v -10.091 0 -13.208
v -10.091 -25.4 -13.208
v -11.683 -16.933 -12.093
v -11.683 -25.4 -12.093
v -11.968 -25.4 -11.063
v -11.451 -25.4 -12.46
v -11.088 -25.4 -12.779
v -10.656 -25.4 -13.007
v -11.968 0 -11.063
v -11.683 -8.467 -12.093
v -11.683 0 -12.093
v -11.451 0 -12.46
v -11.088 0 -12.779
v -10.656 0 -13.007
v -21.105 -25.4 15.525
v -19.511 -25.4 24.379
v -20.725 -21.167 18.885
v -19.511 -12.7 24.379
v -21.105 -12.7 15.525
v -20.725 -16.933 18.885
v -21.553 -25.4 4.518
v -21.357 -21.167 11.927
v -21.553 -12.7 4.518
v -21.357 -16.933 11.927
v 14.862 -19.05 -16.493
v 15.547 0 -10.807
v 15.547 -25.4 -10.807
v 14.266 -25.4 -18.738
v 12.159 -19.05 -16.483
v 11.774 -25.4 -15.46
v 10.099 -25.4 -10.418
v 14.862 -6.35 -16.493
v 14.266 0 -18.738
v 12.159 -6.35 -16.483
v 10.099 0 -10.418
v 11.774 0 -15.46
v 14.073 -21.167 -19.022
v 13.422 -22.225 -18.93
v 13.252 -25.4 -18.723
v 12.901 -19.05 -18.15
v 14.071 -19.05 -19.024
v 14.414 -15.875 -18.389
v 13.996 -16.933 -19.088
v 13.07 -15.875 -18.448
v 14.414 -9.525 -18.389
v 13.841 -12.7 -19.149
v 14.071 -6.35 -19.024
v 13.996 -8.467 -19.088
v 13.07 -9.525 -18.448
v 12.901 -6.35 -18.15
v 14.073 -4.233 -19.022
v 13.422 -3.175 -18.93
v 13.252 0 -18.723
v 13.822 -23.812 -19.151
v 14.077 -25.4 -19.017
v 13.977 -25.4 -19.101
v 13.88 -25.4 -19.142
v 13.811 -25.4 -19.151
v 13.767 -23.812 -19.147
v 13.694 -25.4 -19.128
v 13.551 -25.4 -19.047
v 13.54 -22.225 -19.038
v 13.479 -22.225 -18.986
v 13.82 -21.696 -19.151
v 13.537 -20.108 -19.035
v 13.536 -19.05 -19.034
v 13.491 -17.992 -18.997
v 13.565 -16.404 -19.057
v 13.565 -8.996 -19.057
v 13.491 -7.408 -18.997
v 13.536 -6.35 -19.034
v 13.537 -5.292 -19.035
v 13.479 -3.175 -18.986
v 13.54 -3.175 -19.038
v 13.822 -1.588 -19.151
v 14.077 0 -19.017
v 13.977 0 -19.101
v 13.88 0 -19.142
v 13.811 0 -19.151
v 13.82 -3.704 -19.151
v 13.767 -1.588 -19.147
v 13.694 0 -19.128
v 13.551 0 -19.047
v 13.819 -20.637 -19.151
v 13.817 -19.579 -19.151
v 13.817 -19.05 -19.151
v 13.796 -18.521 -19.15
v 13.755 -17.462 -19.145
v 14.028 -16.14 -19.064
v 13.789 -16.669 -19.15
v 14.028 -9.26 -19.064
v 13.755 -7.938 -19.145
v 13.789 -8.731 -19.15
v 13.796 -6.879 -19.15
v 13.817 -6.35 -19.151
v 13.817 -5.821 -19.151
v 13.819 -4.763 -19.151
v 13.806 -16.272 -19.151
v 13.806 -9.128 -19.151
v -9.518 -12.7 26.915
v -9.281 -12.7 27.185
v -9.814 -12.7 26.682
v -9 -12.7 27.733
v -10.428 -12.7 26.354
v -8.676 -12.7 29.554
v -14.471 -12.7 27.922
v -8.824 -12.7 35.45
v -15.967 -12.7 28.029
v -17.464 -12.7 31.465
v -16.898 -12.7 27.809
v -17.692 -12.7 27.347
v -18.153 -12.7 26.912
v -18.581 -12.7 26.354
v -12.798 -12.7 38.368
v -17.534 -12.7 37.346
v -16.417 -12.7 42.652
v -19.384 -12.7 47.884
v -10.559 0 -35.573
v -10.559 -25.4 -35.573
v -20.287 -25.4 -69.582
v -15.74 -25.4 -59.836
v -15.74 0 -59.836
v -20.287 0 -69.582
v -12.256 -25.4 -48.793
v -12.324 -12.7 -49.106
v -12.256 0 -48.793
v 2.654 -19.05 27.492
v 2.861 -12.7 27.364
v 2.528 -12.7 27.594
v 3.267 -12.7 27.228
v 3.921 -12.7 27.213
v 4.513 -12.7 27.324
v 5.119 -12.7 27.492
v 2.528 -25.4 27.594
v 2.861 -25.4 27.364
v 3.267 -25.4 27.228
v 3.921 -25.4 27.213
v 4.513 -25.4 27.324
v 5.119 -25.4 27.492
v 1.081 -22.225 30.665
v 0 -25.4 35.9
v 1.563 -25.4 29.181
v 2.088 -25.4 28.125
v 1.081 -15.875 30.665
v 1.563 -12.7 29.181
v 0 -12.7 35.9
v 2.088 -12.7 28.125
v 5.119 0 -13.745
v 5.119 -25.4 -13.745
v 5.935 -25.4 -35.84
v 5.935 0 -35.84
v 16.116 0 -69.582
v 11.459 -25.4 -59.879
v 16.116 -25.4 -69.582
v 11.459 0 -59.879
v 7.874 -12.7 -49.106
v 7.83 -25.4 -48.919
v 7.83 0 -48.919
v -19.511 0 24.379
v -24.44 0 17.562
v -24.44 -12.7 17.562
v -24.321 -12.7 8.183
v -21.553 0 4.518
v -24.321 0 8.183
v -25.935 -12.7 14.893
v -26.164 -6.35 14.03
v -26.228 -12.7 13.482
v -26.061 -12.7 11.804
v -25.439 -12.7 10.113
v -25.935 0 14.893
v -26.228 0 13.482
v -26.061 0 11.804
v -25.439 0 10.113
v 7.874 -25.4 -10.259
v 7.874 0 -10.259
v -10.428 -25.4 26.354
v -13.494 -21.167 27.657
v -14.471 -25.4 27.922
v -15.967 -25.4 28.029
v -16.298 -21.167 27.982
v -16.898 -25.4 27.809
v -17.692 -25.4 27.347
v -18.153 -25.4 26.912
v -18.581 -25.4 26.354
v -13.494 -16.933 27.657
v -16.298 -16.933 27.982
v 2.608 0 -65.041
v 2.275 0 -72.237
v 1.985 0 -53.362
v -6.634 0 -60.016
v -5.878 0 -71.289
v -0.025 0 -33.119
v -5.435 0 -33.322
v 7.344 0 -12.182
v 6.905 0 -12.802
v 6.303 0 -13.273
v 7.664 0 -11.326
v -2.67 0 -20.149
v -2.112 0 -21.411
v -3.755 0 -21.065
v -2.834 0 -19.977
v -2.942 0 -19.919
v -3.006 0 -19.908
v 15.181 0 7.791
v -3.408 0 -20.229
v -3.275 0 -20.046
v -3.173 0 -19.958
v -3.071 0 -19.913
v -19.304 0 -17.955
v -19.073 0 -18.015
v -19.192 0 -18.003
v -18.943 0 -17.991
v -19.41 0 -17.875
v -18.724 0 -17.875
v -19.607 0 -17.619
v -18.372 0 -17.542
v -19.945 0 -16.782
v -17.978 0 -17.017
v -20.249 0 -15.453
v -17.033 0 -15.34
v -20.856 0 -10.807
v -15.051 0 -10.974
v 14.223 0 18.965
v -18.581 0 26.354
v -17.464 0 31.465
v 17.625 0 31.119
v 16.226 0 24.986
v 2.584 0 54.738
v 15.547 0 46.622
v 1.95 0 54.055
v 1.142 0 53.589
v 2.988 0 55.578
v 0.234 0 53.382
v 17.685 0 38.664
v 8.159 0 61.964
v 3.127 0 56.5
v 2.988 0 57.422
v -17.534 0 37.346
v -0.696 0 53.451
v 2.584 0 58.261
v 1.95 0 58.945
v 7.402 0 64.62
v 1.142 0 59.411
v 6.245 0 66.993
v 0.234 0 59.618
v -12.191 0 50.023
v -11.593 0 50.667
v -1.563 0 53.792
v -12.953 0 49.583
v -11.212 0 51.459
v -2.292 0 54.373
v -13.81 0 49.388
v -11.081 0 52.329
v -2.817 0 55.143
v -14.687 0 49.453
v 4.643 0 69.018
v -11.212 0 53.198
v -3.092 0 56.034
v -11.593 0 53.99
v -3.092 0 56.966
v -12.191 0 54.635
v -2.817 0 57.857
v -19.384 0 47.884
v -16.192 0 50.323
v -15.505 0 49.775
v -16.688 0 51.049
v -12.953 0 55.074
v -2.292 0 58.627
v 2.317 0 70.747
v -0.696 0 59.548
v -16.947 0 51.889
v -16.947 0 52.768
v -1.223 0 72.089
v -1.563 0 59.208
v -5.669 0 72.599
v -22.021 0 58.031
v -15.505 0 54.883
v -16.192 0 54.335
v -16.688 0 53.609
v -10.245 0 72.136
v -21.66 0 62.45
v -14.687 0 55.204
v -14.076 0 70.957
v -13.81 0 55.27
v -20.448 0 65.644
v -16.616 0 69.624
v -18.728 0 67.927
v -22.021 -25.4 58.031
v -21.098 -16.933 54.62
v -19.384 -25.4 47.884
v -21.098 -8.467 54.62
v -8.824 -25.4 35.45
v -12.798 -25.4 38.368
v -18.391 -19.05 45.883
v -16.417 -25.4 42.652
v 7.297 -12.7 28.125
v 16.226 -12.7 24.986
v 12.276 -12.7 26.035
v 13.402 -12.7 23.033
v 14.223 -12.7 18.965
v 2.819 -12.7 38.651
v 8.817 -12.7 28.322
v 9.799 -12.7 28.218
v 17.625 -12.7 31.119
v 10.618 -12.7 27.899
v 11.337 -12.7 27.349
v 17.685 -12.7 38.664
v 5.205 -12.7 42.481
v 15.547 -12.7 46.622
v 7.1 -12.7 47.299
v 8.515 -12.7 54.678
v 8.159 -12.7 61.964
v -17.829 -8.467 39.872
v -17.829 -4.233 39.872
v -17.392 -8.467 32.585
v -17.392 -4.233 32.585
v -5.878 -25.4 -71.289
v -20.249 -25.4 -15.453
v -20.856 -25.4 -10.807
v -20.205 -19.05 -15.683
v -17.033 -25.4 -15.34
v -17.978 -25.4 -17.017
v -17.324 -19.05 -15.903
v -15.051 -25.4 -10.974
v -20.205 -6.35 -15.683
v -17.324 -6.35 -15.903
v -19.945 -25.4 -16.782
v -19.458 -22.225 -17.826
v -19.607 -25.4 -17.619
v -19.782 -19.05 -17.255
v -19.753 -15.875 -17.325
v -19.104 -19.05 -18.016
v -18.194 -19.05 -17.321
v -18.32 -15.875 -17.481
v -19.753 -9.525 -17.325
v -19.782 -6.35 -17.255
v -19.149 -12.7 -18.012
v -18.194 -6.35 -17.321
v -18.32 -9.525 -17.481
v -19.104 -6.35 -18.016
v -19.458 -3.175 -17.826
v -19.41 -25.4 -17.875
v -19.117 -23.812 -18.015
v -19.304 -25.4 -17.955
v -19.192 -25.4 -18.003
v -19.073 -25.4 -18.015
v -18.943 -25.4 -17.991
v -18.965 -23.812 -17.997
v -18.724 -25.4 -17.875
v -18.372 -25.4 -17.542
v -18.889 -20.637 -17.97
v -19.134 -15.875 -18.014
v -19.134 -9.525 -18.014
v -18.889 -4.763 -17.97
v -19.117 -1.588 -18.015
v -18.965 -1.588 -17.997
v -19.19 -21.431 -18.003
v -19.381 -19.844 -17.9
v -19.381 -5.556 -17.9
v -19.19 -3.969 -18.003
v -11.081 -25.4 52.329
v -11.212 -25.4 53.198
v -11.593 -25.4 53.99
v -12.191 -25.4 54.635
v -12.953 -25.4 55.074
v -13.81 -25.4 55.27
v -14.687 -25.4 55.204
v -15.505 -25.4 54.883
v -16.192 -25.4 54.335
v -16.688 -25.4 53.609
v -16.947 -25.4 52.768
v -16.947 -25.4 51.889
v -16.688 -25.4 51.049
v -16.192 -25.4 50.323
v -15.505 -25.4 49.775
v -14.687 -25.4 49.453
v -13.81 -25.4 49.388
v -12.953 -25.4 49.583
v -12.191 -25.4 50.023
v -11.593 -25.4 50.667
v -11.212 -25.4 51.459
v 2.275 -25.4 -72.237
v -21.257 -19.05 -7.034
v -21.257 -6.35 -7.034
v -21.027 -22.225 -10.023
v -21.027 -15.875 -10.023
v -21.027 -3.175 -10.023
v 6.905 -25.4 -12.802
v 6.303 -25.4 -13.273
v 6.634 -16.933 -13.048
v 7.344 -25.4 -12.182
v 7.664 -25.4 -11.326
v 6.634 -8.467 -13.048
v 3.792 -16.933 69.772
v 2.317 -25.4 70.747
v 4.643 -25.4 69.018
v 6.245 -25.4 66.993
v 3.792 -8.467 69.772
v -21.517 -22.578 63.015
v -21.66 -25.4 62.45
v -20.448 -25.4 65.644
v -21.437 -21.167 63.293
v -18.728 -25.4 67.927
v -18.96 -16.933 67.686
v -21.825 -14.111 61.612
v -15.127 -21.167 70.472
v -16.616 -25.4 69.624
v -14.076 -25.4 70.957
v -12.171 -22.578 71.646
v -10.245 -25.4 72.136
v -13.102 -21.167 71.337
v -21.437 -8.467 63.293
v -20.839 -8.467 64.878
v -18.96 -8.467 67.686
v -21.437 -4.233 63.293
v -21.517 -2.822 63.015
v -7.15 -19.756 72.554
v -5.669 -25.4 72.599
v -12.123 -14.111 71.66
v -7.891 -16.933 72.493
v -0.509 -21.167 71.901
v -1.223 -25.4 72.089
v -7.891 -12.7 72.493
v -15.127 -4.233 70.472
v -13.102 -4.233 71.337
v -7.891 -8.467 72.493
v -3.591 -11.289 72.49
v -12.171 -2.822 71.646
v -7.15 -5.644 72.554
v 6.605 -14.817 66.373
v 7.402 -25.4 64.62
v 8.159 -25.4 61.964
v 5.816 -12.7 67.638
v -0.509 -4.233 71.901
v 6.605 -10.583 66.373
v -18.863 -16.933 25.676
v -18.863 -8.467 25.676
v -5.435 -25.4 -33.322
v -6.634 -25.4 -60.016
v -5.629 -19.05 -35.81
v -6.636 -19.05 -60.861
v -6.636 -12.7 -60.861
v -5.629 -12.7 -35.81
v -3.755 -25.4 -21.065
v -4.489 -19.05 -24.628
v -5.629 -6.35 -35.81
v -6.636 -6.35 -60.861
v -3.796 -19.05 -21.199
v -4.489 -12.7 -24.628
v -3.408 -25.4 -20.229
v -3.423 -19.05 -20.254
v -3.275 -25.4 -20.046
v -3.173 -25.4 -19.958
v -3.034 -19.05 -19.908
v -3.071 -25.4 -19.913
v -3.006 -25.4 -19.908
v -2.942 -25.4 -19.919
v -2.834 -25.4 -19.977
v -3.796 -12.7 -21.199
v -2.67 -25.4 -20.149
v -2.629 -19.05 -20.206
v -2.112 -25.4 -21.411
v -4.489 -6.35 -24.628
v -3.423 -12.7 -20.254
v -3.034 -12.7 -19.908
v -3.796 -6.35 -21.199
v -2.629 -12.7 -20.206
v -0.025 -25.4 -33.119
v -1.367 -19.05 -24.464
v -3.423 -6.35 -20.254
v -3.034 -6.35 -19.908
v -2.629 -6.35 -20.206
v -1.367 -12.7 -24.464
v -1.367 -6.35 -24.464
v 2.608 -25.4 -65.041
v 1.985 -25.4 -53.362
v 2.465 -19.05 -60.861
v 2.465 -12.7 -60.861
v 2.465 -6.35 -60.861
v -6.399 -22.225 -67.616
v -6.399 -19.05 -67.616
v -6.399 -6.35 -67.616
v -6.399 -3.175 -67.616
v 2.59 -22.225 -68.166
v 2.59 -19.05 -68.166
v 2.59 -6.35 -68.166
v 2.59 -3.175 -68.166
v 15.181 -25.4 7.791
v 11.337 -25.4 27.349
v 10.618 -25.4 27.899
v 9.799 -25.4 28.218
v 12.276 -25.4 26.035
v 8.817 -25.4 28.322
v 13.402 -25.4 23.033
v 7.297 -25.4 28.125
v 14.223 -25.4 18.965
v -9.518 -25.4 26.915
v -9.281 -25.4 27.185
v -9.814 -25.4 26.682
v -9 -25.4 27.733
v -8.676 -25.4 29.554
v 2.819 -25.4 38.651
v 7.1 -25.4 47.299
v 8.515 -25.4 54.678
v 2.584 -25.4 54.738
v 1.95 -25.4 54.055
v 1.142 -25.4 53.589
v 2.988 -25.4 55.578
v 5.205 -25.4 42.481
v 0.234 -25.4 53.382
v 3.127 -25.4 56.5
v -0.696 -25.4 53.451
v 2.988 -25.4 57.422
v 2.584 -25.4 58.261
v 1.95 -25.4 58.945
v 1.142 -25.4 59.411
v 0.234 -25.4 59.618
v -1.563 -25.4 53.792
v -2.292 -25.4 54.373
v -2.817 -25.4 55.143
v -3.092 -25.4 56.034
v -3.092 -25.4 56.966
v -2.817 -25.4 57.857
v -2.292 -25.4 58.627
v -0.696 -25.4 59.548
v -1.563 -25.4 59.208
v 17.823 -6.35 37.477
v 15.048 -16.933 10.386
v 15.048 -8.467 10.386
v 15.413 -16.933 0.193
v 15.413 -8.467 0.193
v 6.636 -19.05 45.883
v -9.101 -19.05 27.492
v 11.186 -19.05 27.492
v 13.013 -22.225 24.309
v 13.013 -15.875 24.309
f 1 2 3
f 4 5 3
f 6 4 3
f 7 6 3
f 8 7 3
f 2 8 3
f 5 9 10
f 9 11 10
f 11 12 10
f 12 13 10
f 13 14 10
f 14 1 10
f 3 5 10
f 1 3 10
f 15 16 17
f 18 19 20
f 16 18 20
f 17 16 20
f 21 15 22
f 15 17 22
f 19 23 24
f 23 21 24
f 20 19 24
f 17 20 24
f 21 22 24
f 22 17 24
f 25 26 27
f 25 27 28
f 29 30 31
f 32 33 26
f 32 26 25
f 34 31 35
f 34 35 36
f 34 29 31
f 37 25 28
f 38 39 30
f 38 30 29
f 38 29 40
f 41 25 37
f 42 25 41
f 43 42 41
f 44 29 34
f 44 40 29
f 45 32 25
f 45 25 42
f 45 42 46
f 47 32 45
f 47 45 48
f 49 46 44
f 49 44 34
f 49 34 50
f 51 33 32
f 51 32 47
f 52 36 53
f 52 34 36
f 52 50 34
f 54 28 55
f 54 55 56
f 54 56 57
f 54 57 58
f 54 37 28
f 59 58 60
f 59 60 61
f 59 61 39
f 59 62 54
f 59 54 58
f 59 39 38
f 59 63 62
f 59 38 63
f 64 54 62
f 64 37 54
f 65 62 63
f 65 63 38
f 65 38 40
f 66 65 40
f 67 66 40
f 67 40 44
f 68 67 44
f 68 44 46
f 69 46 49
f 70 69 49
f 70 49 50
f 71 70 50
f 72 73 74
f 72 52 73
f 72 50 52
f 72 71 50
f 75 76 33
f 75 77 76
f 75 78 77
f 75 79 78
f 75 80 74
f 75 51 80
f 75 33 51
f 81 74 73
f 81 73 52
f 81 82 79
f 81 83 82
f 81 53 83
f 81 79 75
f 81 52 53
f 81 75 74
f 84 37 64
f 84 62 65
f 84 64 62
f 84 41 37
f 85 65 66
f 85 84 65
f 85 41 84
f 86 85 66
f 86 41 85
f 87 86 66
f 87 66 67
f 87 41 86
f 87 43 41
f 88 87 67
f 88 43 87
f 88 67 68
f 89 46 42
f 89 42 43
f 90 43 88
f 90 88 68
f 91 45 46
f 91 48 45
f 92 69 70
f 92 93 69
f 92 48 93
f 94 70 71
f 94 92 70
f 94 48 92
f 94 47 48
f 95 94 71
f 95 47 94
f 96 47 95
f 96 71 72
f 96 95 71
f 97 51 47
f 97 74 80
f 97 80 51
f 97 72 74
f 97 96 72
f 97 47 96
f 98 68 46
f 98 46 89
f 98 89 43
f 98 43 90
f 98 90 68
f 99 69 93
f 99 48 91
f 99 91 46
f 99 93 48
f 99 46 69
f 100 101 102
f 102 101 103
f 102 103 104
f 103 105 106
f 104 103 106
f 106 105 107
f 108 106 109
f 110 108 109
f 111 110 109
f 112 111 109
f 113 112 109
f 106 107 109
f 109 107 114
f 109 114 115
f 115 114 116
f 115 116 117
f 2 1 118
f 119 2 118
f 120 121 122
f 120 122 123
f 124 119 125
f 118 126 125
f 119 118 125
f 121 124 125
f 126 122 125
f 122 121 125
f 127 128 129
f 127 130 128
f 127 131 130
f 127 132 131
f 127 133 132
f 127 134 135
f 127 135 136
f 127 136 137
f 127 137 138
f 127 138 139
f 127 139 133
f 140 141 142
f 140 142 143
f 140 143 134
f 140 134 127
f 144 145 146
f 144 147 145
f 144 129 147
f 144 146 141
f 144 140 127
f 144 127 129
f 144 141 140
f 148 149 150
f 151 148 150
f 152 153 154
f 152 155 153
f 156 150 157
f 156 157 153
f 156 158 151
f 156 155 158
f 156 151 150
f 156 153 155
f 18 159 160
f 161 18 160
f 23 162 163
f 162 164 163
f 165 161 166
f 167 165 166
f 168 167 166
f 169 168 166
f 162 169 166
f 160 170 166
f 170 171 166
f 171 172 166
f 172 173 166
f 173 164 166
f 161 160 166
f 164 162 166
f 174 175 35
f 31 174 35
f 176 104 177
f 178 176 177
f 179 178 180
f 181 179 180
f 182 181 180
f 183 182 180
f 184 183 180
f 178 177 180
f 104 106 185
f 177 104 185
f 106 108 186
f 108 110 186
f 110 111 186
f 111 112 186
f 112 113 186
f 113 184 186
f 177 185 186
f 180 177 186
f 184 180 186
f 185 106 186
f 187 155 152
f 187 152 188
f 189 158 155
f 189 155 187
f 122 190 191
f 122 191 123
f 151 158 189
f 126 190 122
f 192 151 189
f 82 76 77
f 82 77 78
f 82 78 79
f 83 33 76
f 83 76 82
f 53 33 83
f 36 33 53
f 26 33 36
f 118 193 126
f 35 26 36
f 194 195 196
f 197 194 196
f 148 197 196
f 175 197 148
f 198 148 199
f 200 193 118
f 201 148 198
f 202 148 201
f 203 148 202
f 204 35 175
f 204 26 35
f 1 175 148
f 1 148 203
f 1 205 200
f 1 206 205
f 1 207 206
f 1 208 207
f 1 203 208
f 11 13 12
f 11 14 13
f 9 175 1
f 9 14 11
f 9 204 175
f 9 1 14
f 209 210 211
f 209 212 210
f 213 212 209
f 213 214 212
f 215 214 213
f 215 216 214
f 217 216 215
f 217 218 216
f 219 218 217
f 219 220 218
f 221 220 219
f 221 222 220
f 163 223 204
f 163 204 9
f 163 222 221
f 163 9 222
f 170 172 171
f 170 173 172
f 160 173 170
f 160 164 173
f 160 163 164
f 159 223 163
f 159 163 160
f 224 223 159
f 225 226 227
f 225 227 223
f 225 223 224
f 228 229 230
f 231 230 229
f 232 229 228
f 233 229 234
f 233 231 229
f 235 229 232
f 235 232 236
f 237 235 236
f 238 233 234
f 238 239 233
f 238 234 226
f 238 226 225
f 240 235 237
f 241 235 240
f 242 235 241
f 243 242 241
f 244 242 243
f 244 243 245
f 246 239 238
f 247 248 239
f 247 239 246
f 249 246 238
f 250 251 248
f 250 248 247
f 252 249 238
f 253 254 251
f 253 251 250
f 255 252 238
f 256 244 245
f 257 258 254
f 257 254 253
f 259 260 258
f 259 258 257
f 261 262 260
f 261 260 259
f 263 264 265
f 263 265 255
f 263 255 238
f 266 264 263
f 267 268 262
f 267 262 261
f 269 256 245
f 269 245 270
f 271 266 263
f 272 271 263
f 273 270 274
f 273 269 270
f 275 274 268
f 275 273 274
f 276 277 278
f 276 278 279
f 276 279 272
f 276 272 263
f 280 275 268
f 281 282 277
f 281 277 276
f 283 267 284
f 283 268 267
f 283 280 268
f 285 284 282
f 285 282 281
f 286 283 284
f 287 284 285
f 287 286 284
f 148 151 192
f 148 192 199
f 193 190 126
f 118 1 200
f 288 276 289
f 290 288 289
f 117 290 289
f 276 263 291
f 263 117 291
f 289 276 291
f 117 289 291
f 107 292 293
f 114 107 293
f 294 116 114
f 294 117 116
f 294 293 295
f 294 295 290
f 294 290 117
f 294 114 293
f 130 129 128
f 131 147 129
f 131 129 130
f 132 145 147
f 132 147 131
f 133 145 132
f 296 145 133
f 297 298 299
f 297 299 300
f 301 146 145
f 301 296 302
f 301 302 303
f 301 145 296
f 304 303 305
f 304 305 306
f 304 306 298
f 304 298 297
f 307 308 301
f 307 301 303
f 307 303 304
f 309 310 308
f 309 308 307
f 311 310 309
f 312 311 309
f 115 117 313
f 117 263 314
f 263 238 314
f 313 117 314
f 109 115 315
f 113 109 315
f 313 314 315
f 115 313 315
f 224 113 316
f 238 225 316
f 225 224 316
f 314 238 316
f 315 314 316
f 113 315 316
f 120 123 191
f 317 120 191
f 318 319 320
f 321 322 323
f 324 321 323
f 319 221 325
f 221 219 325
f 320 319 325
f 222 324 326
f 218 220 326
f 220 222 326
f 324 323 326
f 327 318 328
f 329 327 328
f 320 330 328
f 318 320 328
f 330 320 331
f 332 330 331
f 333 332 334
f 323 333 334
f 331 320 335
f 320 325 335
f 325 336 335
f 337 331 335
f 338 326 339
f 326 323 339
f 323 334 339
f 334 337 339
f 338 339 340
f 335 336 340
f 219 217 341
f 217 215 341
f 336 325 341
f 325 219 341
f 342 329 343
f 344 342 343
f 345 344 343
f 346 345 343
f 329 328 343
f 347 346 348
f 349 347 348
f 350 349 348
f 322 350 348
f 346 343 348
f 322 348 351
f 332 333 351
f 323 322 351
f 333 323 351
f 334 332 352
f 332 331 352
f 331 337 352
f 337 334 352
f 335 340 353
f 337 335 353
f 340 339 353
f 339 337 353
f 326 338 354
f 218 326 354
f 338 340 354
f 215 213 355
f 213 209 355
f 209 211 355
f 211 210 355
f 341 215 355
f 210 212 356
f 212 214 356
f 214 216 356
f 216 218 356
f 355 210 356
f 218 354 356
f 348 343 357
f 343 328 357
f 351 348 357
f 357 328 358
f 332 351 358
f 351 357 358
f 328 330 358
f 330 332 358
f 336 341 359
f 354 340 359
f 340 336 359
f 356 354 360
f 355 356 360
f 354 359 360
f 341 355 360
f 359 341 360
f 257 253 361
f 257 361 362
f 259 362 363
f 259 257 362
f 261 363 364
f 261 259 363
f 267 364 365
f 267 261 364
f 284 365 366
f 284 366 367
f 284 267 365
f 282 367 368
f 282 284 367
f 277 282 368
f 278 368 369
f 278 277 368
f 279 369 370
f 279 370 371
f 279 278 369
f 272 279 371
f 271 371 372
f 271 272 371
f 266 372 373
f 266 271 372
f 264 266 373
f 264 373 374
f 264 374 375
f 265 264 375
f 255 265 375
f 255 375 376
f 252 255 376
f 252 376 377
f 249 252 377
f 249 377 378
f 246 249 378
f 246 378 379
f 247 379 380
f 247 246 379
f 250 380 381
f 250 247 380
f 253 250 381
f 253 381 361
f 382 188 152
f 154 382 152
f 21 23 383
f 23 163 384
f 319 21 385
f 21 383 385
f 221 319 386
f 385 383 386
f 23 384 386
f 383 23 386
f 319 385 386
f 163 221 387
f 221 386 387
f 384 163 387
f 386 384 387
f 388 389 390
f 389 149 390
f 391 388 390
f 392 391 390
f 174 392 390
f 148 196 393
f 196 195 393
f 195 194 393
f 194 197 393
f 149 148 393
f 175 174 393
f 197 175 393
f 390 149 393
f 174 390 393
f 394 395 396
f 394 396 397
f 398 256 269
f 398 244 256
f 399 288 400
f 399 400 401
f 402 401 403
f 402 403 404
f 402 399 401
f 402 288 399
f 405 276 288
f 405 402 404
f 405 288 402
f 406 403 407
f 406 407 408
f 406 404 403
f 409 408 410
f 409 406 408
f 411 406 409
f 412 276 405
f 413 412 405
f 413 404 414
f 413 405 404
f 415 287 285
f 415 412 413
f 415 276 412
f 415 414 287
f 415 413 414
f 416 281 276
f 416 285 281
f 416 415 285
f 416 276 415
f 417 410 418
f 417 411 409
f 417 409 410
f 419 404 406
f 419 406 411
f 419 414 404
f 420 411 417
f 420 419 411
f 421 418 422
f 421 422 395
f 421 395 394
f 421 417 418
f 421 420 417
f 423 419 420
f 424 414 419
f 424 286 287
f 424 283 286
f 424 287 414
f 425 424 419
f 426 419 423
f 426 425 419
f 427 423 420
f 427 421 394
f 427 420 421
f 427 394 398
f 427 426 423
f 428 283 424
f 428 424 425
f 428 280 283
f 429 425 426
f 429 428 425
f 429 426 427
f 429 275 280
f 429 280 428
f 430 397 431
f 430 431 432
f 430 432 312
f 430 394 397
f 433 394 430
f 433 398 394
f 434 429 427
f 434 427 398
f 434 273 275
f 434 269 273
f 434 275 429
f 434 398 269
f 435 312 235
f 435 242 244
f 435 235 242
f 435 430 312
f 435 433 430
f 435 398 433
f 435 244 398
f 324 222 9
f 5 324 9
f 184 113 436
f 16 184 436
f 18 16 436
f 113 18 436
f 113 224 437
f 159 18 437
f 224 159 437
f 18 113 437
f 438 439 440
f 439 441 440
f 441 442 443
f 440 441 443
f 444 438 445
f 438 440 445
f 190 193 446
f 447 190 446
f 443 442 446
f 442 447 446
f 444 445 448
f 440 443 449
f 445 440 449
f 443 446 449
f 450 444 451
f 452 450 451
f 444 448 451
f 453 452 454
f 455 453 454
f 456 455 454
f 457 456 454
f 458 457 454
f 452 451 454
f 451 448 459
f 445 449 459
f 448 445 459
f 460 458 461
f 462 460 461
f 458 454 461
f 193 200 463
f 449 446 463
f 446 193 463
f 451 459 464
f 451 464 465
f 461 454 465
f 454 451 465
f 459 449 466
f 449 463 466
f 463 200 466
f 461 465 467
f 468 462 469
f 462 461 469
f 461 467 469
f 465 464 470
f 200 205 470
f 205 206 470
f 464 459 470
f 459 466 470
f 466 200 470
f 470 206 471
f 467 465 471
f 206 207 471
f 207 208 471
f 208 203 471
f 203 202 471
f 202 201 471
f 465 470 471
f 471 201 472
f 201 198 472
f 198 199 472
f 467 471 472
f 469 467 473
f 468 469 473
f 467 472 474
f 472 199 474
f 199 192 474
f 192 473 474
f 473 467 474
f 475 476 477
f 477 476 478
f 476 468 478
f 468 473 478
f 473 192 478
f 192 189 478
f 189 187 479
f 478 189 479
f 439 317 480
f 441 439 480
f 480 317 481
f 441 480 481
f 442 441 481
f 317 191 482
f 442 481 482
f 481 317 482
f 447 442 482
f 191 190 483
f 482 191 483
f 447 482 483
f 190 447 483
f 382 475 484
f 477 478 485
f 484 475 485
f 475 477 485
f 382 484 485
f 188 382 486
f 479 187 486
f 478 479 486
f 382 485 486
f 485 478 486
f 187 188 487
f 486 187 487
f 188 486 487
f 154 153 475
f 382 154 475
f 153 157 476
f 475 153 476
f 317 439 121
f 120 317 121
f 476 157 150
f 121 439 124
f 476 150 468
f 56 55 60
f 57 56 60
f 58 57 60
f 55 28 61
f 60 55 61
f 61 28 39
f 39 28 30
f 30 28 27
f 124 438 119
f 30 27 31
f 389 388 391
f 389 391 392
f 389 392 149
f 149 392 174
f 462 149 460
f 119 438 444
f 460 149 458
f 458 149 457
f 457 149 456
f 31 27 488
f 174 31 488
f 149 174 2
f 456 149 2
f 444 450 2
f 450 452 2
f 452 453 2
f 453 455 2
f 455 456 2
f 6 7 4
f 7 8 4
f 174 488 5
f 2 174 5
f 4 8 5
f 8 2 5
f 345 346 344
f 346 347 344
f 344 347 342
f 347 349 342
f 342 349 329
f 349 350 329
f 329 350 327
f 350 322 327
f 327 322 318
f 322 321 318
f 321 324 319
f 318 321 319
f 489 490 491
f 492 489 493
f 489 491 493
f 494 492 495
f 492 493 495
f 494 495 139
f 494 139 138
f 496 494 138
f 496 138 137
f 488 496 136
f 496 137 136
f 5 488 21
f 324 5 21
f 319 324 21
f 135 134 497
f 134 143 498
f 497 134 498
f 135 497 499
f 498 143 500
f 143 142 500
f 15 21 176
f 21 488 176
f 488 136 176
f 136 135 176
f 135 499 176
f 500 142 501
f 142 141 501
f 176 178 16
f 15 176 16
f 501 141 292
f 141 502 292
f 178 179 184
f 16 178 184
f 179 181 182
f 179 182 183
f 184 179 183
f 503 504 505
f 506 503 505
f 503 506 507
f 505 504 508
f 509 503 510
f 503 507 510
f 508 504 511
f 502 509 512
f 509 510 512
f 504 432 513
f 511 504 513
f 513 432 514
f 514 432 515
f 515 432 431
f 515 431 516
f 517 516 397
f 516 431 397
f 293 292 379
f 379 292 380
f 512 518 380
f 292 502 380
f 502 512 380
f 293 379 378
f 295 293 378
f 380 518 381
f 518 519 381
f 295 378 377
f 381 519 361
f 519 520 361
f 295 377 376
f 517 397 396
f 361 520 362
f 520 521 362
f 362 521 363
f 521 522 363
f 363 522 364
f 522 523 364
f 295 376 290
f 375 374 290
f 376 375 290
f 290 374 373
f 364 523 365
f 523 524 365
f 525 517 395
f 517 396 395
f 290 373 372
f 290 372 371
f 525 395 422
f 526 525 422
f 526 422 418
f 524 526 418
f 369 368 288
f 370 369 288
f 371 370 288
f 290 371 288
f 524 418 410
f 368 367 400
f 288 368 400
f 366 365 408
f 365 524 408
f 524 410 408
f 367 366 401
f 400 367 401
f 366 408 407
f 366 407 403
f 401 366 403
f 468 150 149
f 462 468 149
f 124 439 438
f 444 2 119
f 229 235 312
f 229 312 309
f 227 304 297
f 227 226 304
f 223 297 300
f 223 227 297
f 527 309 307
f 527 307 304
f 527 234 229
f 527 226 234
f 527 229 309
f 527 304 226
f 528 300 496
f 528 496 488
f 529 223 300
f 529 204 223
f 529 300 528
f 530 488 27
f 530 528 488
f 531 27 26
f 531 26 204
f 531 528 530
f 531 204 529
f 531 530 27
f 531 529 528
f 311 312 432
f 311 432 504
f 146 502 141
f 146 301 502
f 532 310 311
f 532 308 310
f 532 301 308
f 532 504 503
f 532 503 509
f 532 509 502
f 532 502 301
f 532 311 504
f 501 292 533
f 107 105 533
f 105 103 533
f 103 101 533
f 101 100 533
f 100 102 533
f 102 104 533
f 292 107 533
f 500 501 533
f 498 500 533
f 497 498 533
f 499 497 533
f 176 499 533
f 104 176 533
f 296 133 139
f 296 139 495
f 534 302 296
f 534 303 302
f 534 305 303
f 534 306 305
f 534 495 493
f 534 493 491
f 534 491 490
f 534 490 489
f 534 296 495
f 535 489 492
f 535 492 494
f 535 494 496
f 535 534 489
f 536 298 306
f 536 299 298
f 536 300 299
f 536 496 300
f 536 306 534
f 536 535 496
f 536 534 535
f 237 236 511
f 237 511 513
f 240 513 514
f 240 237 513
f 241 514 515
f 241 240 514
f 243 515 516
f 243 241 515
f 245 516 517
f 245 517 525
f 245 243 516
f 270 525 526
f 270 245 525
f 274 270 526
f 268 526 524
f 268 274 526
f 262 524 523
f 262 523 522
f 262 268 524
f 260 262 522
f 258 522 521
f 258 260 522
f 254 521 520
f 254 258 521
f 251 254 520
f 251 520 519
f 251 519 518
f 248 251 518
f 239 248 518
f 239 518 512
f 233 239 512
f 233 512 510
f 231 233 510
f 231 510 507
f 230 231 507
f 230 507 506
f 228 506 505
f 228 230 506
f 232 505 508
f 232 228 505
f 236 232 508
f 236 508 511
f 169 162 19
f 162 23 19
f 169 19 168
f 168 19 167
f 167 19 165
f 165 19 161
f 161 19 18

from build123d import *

# Parameters (mm, degrees)
F0_R     = 2.9494351417
F0_R_2   = 3.1269179554
F1_DEPTH = 25.4
F2_DEPTH = 12.7


with BuildPart() as f1:
    # F0 (on Front) → F1 (new body)
    with BuildSketch(Plane.XZ):
        with BuildLine():
            add(Edge.make_bspline(
                [(-4.3607349508, 34.3170873821), (-5.8159647731, 34.266180532), (-7.3260798919, 34.6754060156), (-8.8239335735, 35.4499210748)],
                knots=[0, 0, 0, 0, 0.0558604963, 0.0558604963, 0.0558604963, 0.0558604963], degree=3))
            add(Edge.make_bspline(
                [(0, 35.9002791652), (-1.3646498289, 34.9315221296), (-2.8324242194, 34.3705507485), (-4.3607349508, 34.3170873821)],
                knots=[0.9413342177, 0.9413342177, 0.9413342177, 0.9413342177, 1, 1, 1, 1], degree=3))
            add(Edge.make_bspline(
                [(8.1590511892, 61.9637204051), (9.1888372029, 56.929624723), (7.6915449767, 45.4957659335), (2.7445864281, 37.8486452262), (0, 35.9002791652)],
                knots=[0.6905514826, 0.6905514826, 0.6905514826, 0.6905514826, 0.8233454805, 0.9413342177, 0.9413342177, 0.9413342177, 0.9413342177], degree=3))
            add(Edge.make_bspline(
                [(-22.0211678961, 58.0308431791), (-22.1869263998, 61.722066111), (-19.4617275875, 72.4905198421), (2.6471335613, 74.9151403272), (7.5068546983, 65.1519745619), (8.1590511892, 61.9637204051)],
                knots=[0.2961980111, 0.2961980111, 0.2961980111, 0.2961980111, 0.395080951, 0.6064487872, 0.6905514826, 0.6905514826, 0.6905514826, 0.6905514826], degree=3))
            add(Edge.make_bspline(
                [(-22.0211678961, 58.0308431791), (-21.0930203688, 54.6165518536), (-20.1646660473, 51.2021484936), (-19.3839201593, 47.8835665328)],
                knots=[0, 0, 0, 0, 0.1273376133, 0.1273376133, 0.1273376133, 0.1273376133], degree=3))
            add(Edge.make_bspline(
                [(-8.8239335735, 35.4499210748), (-12.3821829949, 37.2898322723), (-16.3569635, 41.7343103663), (-19.07368946, 47.2040259263), (-19.3839201593, 47.8835665328)],
                knots=[0.0558604963, 0.0558604963, 0.0558604963, 0.0558604963, 0.1885607602, 0.207034532, 0.207034532, 0.207034532, 0.207034532], degree=3))
        make_face()
        with Locations((-14.0301892534, 52.3288138211)):
            Circle(F0_R, mode=Mode.SUBTRACT)
        with Locations((0, 56.499954313)):
            Circle(F0_R_2, mode=Mode.SUBTRACT)
        with BuildLine():
            add(Edge.make_bspline(
                [(0, 35.9002791652), (-1.3646498289, 34.9315221296), (-2.8324242194, 34.3705507485), (-4.3607349508, 34.3170873821)],
                knots=[0.9413342177, 0.9413342177, 0.9413342177, 0.9413342177, 1, 1, 1, 1], degree=3))
            add(Edge.make_bspline(
                [(-4.3607349508, 34.3170873821), (-5.8159647731, 34.266180532), (-7.3260798919, 34.6754060156), (-8.8239335735, 35.4499210748)],
                knots=[0, 0, 0, 0, 0.0558604963, 0.0558604963, 0.0558604963, 0.0558604963], degree=3))
            add(Edge.make_bspline(
                [(-8.8239335735, 35.4499210748), (-8.6194381151, 32.1814535678), (-8.3368843444, 27.3494594149), (-9.9219897476, 26.5952865599), (-10.4278437793, 26.3540036976)],
                knots=[0, 0, 0, 0, 0.6809576007, 1, 1, 1, 1], degree=3))
            add(Edge.make_bspline(
                [(-10.4278437793, 26.3540036976), (-13.5372550637, 27.8193594175), (-16.64666634, 29.2847151335), (-18.5805223781, 26.354003713)],
                knots=[0, 0, 0, 0, 0.2894887536, 0.2894887536, 0.2894887536, 0.2894887536], degree=3))
            add(Edge.make_bspline(
                [(-18.5805223882, 26.3540036976), (-18.8474893981, 25.6657310236), (-19.1628757455, 25.0088850241), (-19.5109327232, 24.378981395)],
                knots=[0.4444669687, 0.4444669687, 0.4444669687, 0.4444669687, 0.4834838181, 0.4834838181, 0.4834838181, 0.4834838181], degree=3))
            add(Edge.make_bspline(
                [(-19.5109327232, 24.378981395), (-21.0643674832, 19.9531113363), (-21.5262468174, 11.8158457348), (-21.5533071763, 4.5179931389)],
                knots=[0.3413897295, 0.3413897295, 0.3413897295, 0.3413897295, 0.6348121446, 0.6348121446, 0.6348121446, 0.6348121446], degree=3))
            add(Edge.make_bspline(
                [(-21.5533071763, 4.5179931389), (-21.577792476, -2.0853970393), (-21.1218013847, -10.2228609905), (-20.9127527805, -10.6817670726), (-20.8556875587, -10.8070373535)],
                knots=[0.6348121446, 0.6348121446, 0.6348121446, 0.6348121446, 0.9003125323, 1, 1, 1, 1], degree=3))
            Line((-20.8556875587, -10.8070373535), (-15.0507342077, -10.9744156837))
            Line((-15.0507342077, -10.9744156837), (-11.9681432843, -11.0632982105))
            add(Edge.make_bspline(
                [(-11.9681432843, -11.0632982105), (-11.7523383257, -12.3312092814), (-11.4293724426, -12.803583638), (-10.0912256166, -13.2083445787)],
                knots=[0.2841176244, 0.2841176244, 0.2841176244, 0.2841176244, 0.3781726374, 0.3781726374, 0.3781726374, 0.3781726374], degree=3))
            add(Edge.make_bspline(
                [(-10.0912256166, -13.2083445787), (-6.999042893, -14.1436640549), (1.5139752093, -14.7179432662), (5.1191220991, -13.7446066365)],
                knots=[0.3781726374, 0.3781726374, 0.3781726374, 0.3781726374, 0.5955144721, 0.5955144721, 0.5955144721, 0.5955144721], degree=3))
            add(Edge.make_bspline(
                [(5.1191220991, -13.7446066365), (7.0668957023, -13.2187364147), (7.5820718333, -12.2411203248), (7.8735407442, -10.2589046583)],
                knots=[0.5955144721, 0.5955144721, 0.5955144721, 0.5955144721, 0.7129390047, 0.7129390047, 0.7129390047, 0.7129390047], degree=3))
            Line((7.8735407442, -10.2589046583), (10.0993986167, -10.4179034599))
            Line((10.0993986167, -10.4179034599), (15.5469663441, -10.8070373535))
            add(Edge.make_bspline(
                [(14.2226914281, 18.9650026151), (15.3554039912, 11.4628427606), (15.4511851676, 0.3279027036), (15.5469663441, -10.8070373535)],
                knots=[0.5401467708, 0.5401467708, 0.5401467708, 0.5401467708, 1, 1, 1, 1], degree=3))
            add(Edge.make_bspline(
                [(5.1191220991, 27.4915862828), (7.3468122477, 28.2109019634), (11.5830450619, 29.5787711404), (13.5918597378, 23.1431148181), (14.2226914281, 18.9650026151)],
                knots=[0, 0, 0, 0, 0.2840447381, 0.5401467708, 0.5401467708, 0.5401467708, 0.5401467708], degree=3))
            add(Edge.make_bspline(
                [(0, 35.9002791652), (0.6659120514, 32.1806234635), (1.6838923464, 26.494382766), (4.2363538824, 27.2353298943), (5.1191220991, 27.4915862828)],
                knots=[0, 0, 0, 0, 0.6541502372, 1, 1, 1, 1], degree=3))
        make_face()
        with BuildLine():
            add(Edge.make_bspline(
                [(5.1191220991, -13.7446066365), (5.3204684593, -26.4078442093), (5.6806533545, -49.0608829649), (12.9222659431, -63.3019604329), (16.1157567054, -69.582156837)],
                knots=[0, 0, 0, 0, 0.5590083392, 1, 1, 1, 1], degree=3))
            add(Edge.make_bspline(
                [(-10.0912256166, -13.2083445787), (-6.999042893, -14.1436640549), (1.5139752093, -14.7179432662), (5.1191220991, -13.7446066365)],
                knots=[0.3781726374, 0.3781726374, 0.3781726374, 0.3781726374, 0.5955144721, 0.5955144721, 0.5955144721, 0.5955144721], degree=3))
            add(Edge.make_bspline(
                [(-10.0912256166, -13.2083445787), (-10.0911388765, -26.0813857287), (-10.0909843429, -49.0156260347), (-17.1778871585, -63.310867055), (-20.2868953347, -69.582156837)],
                knots=[0, 0, 0, 0, 0.5613022702, 1, 1, 1, 1], degree=3))
            Line((-20.2868953347, -69.582156837), (-5.8775120415, -71.2885335088))
            add(Edge.make_bspline(
                [(-5.8775120415, -71.2885335088), (-6.2564772228, -69.1830736559), (-7.386907722, -62.90261268), (-3.6582190501, 8.5281088891), (3.2850759179, -63.0431020915), (2.5337375888, -69.8826869928), (2.2751661018, -72.2365155816)],
                knots=[0, 0, 0, 0, 0.1662763633, 0.4959924596, 0.8265468775, 1, 1, 1, 1], degree=3))
            Line((2.2751661018, -72.2365155816), (16.1157567054, -69.582156837))
        make_face()
        with BuildLine():
            add(Edge.make_bspline(
                [(15.5469663441, -10.8070373535), (15.1276841103, -14.9343334931), (14.2669666052, -23.4069940283), (11.5160993619, -14.8561836208), (10.0993986167, -10.4179034599)],
                knots=[0, 0, 0, 0, 0.4841661128, 0.993913443, 0.993913443, 0.993913443, 0.993913443], degree=3))
            Line((15.5469663441, -10.8070373535), (10.0993986167, -10.4179034599))
        make_face()
        with BuildLine():
            Line((-15.0507342077, -10.9744156837), (-20.8556875587, -10.8070373535))
            add(Edge.make_bspline(
                [(-20.8556875587, -10.8070373535), (-20.4670630449, -14.3410148632), (-19.6726079619, -21.5654340555), (-16.6193671781, -14.5925942328), (-15.0507342077, -10.9744156837)],
                knots=[0, 0, 0, 0, 0.4853486561, 0.9921857557, 0.9921857557, 0.9921857557, 0.9921857557], degree=3))
        make_face()
    extrude(amount=F1_DEPTH)

    # F0 (on Front) → F2 (join)
    with BuildSketch(Plane.XZ):
        with BuildLine():
            add(Edge.make_bspline(
                [(-8.8239335735, 35.4499210748), (-8.6194381151, 32.1814535678), (-8.3368843444, 27.3494594149), (-9.9219897476, 26.5952865599), (-10.4278437793, 26.3540036976)],
                knots=[0, 0, 0, 0, 0.6809576007, 1, 1, 1, 1], degree=3))
            add(Edge.make_bspline(
                [(-8.8239335735, 35.4499210748), (-12.3821829949, 37.2898322723), (-16.3569635, 41.7343103663), (-19.07368946, 47.2040259263), (-19.3839201593, 47.8835665328)],
                knots=[0.0558604963, 0.0558604963, 0.0558604963, 0.0558604963, 0.1885607602, 0.207034532, 0.207034532, 0.207034532, 0.207034532], degree=3))
            add(Edge.make_bspline(
                [(-19.3839201593, 47.8835665328), (-17.4395030004, 39.6187676959), (-16.410611773, 31.9482911058), (-18.5805223882, 26.3540036976)],
                knots=[0.1273376133, 0.1273376133, 0.1273376133, 0.1273376133, 0.4444669687, 0.4444669687, 0.4444669687, 0.4444669687], degree=3))
            add(Edge.make_bspline(
                [(-10.4278437793, 26.3540036976), (-13.5372550637, 27.8193594175), (-16.64666634, 29.2847151335), (-18.5805223781, 26.354003713)],
                knots=[0, 0, 0, 0, 0.2894887536, 0.2894887536, 0.2894887536, 0.2894887536], degree=3))
        make_face()
        with BuildLine():
            add(Edge.make_bspline(
                [(-19.5109327232, 24.378981395), (-21.0643674832, 19.9531113363), (-21.5262468174, 11.8158457348), (-21.5533071763, 4.5179931389)],
                knots=[0.3413897295, 0.3413897295, 0.3413897295, 0.3413897295, 0.6348121446, 0.6348121446, 0.6348121446, 0.6348121446], degree=3))
            add(Edge.make_bspline(
                [(-19.5109327232, 24.378981395), (-21.8348555242, 20.1732119385), (-29.3302897757, 14.2158038787), (-24.1232589853, 7.7328778416), (-21.5533071763, 4.5179931389)],
                knots=[0.4834838181, 0.4834838181, 0.4834838181, 0.4834838181, 0.7439933089, 1, 1, 1, 1], degree=3))
        make_face()
        with BuildLine():
            add(Edge.make_bspline(
                [(8.1590511892, 61.9637204051), (9.1888372029, 56.929624723), (7.6915449767, 45.4957659335), (2.7445864281, 37.8486452262), (0, 35.9002791652)],
                knots=[0.6905514826, 0.6905514826, 0.6905514826, 0.6905514826, 0.8233454805, 0.9413342177, 0.9413342177, 0.9413342177, 0.9413342177], degree=3))
            add(Edge.make_bspline(
                [(0, 35.9002791652), (0.6659120514, 32.1806234635), (1.6838923464, 26.494382766), (4.2363538824, 27.2353298943), (5.1191220991, 27.4915862828)],
                knots=[0, 0, 0, 0, 0.6541502372, 1, 1, 1, 1], degree=3))
            add(Edge.make_bspline(
                [(5.1191220991, 27.4915862828), (7.3468122477, 28.2109019634), (11.5830450619, 29.5787711404), (13.5918597378, 23.1431148181), (14.2226914281, 18.9650026151)],
                knots=[0, 0, 0, 0, 0.2840447381, 0.5401467708, 0.5401467708, 0.5401467708, 0.5401467708], degree=3))
            add(Edge.make_bspline(
                [(8.1590511892, 61.9637204051), (12.6372937315, 53.5646840832), (20.9003420601, 38.0594699763), (16.3294038546, 24.9669144954), (14.2226914281, 18.9650026151)],
                knots=[0, 0, 0, 0, 0.5415898832, 1, 1, 1, 1], degree=3))
        make_face()
    extrude(amount=F2_DEPTH)


solid = f1.part
